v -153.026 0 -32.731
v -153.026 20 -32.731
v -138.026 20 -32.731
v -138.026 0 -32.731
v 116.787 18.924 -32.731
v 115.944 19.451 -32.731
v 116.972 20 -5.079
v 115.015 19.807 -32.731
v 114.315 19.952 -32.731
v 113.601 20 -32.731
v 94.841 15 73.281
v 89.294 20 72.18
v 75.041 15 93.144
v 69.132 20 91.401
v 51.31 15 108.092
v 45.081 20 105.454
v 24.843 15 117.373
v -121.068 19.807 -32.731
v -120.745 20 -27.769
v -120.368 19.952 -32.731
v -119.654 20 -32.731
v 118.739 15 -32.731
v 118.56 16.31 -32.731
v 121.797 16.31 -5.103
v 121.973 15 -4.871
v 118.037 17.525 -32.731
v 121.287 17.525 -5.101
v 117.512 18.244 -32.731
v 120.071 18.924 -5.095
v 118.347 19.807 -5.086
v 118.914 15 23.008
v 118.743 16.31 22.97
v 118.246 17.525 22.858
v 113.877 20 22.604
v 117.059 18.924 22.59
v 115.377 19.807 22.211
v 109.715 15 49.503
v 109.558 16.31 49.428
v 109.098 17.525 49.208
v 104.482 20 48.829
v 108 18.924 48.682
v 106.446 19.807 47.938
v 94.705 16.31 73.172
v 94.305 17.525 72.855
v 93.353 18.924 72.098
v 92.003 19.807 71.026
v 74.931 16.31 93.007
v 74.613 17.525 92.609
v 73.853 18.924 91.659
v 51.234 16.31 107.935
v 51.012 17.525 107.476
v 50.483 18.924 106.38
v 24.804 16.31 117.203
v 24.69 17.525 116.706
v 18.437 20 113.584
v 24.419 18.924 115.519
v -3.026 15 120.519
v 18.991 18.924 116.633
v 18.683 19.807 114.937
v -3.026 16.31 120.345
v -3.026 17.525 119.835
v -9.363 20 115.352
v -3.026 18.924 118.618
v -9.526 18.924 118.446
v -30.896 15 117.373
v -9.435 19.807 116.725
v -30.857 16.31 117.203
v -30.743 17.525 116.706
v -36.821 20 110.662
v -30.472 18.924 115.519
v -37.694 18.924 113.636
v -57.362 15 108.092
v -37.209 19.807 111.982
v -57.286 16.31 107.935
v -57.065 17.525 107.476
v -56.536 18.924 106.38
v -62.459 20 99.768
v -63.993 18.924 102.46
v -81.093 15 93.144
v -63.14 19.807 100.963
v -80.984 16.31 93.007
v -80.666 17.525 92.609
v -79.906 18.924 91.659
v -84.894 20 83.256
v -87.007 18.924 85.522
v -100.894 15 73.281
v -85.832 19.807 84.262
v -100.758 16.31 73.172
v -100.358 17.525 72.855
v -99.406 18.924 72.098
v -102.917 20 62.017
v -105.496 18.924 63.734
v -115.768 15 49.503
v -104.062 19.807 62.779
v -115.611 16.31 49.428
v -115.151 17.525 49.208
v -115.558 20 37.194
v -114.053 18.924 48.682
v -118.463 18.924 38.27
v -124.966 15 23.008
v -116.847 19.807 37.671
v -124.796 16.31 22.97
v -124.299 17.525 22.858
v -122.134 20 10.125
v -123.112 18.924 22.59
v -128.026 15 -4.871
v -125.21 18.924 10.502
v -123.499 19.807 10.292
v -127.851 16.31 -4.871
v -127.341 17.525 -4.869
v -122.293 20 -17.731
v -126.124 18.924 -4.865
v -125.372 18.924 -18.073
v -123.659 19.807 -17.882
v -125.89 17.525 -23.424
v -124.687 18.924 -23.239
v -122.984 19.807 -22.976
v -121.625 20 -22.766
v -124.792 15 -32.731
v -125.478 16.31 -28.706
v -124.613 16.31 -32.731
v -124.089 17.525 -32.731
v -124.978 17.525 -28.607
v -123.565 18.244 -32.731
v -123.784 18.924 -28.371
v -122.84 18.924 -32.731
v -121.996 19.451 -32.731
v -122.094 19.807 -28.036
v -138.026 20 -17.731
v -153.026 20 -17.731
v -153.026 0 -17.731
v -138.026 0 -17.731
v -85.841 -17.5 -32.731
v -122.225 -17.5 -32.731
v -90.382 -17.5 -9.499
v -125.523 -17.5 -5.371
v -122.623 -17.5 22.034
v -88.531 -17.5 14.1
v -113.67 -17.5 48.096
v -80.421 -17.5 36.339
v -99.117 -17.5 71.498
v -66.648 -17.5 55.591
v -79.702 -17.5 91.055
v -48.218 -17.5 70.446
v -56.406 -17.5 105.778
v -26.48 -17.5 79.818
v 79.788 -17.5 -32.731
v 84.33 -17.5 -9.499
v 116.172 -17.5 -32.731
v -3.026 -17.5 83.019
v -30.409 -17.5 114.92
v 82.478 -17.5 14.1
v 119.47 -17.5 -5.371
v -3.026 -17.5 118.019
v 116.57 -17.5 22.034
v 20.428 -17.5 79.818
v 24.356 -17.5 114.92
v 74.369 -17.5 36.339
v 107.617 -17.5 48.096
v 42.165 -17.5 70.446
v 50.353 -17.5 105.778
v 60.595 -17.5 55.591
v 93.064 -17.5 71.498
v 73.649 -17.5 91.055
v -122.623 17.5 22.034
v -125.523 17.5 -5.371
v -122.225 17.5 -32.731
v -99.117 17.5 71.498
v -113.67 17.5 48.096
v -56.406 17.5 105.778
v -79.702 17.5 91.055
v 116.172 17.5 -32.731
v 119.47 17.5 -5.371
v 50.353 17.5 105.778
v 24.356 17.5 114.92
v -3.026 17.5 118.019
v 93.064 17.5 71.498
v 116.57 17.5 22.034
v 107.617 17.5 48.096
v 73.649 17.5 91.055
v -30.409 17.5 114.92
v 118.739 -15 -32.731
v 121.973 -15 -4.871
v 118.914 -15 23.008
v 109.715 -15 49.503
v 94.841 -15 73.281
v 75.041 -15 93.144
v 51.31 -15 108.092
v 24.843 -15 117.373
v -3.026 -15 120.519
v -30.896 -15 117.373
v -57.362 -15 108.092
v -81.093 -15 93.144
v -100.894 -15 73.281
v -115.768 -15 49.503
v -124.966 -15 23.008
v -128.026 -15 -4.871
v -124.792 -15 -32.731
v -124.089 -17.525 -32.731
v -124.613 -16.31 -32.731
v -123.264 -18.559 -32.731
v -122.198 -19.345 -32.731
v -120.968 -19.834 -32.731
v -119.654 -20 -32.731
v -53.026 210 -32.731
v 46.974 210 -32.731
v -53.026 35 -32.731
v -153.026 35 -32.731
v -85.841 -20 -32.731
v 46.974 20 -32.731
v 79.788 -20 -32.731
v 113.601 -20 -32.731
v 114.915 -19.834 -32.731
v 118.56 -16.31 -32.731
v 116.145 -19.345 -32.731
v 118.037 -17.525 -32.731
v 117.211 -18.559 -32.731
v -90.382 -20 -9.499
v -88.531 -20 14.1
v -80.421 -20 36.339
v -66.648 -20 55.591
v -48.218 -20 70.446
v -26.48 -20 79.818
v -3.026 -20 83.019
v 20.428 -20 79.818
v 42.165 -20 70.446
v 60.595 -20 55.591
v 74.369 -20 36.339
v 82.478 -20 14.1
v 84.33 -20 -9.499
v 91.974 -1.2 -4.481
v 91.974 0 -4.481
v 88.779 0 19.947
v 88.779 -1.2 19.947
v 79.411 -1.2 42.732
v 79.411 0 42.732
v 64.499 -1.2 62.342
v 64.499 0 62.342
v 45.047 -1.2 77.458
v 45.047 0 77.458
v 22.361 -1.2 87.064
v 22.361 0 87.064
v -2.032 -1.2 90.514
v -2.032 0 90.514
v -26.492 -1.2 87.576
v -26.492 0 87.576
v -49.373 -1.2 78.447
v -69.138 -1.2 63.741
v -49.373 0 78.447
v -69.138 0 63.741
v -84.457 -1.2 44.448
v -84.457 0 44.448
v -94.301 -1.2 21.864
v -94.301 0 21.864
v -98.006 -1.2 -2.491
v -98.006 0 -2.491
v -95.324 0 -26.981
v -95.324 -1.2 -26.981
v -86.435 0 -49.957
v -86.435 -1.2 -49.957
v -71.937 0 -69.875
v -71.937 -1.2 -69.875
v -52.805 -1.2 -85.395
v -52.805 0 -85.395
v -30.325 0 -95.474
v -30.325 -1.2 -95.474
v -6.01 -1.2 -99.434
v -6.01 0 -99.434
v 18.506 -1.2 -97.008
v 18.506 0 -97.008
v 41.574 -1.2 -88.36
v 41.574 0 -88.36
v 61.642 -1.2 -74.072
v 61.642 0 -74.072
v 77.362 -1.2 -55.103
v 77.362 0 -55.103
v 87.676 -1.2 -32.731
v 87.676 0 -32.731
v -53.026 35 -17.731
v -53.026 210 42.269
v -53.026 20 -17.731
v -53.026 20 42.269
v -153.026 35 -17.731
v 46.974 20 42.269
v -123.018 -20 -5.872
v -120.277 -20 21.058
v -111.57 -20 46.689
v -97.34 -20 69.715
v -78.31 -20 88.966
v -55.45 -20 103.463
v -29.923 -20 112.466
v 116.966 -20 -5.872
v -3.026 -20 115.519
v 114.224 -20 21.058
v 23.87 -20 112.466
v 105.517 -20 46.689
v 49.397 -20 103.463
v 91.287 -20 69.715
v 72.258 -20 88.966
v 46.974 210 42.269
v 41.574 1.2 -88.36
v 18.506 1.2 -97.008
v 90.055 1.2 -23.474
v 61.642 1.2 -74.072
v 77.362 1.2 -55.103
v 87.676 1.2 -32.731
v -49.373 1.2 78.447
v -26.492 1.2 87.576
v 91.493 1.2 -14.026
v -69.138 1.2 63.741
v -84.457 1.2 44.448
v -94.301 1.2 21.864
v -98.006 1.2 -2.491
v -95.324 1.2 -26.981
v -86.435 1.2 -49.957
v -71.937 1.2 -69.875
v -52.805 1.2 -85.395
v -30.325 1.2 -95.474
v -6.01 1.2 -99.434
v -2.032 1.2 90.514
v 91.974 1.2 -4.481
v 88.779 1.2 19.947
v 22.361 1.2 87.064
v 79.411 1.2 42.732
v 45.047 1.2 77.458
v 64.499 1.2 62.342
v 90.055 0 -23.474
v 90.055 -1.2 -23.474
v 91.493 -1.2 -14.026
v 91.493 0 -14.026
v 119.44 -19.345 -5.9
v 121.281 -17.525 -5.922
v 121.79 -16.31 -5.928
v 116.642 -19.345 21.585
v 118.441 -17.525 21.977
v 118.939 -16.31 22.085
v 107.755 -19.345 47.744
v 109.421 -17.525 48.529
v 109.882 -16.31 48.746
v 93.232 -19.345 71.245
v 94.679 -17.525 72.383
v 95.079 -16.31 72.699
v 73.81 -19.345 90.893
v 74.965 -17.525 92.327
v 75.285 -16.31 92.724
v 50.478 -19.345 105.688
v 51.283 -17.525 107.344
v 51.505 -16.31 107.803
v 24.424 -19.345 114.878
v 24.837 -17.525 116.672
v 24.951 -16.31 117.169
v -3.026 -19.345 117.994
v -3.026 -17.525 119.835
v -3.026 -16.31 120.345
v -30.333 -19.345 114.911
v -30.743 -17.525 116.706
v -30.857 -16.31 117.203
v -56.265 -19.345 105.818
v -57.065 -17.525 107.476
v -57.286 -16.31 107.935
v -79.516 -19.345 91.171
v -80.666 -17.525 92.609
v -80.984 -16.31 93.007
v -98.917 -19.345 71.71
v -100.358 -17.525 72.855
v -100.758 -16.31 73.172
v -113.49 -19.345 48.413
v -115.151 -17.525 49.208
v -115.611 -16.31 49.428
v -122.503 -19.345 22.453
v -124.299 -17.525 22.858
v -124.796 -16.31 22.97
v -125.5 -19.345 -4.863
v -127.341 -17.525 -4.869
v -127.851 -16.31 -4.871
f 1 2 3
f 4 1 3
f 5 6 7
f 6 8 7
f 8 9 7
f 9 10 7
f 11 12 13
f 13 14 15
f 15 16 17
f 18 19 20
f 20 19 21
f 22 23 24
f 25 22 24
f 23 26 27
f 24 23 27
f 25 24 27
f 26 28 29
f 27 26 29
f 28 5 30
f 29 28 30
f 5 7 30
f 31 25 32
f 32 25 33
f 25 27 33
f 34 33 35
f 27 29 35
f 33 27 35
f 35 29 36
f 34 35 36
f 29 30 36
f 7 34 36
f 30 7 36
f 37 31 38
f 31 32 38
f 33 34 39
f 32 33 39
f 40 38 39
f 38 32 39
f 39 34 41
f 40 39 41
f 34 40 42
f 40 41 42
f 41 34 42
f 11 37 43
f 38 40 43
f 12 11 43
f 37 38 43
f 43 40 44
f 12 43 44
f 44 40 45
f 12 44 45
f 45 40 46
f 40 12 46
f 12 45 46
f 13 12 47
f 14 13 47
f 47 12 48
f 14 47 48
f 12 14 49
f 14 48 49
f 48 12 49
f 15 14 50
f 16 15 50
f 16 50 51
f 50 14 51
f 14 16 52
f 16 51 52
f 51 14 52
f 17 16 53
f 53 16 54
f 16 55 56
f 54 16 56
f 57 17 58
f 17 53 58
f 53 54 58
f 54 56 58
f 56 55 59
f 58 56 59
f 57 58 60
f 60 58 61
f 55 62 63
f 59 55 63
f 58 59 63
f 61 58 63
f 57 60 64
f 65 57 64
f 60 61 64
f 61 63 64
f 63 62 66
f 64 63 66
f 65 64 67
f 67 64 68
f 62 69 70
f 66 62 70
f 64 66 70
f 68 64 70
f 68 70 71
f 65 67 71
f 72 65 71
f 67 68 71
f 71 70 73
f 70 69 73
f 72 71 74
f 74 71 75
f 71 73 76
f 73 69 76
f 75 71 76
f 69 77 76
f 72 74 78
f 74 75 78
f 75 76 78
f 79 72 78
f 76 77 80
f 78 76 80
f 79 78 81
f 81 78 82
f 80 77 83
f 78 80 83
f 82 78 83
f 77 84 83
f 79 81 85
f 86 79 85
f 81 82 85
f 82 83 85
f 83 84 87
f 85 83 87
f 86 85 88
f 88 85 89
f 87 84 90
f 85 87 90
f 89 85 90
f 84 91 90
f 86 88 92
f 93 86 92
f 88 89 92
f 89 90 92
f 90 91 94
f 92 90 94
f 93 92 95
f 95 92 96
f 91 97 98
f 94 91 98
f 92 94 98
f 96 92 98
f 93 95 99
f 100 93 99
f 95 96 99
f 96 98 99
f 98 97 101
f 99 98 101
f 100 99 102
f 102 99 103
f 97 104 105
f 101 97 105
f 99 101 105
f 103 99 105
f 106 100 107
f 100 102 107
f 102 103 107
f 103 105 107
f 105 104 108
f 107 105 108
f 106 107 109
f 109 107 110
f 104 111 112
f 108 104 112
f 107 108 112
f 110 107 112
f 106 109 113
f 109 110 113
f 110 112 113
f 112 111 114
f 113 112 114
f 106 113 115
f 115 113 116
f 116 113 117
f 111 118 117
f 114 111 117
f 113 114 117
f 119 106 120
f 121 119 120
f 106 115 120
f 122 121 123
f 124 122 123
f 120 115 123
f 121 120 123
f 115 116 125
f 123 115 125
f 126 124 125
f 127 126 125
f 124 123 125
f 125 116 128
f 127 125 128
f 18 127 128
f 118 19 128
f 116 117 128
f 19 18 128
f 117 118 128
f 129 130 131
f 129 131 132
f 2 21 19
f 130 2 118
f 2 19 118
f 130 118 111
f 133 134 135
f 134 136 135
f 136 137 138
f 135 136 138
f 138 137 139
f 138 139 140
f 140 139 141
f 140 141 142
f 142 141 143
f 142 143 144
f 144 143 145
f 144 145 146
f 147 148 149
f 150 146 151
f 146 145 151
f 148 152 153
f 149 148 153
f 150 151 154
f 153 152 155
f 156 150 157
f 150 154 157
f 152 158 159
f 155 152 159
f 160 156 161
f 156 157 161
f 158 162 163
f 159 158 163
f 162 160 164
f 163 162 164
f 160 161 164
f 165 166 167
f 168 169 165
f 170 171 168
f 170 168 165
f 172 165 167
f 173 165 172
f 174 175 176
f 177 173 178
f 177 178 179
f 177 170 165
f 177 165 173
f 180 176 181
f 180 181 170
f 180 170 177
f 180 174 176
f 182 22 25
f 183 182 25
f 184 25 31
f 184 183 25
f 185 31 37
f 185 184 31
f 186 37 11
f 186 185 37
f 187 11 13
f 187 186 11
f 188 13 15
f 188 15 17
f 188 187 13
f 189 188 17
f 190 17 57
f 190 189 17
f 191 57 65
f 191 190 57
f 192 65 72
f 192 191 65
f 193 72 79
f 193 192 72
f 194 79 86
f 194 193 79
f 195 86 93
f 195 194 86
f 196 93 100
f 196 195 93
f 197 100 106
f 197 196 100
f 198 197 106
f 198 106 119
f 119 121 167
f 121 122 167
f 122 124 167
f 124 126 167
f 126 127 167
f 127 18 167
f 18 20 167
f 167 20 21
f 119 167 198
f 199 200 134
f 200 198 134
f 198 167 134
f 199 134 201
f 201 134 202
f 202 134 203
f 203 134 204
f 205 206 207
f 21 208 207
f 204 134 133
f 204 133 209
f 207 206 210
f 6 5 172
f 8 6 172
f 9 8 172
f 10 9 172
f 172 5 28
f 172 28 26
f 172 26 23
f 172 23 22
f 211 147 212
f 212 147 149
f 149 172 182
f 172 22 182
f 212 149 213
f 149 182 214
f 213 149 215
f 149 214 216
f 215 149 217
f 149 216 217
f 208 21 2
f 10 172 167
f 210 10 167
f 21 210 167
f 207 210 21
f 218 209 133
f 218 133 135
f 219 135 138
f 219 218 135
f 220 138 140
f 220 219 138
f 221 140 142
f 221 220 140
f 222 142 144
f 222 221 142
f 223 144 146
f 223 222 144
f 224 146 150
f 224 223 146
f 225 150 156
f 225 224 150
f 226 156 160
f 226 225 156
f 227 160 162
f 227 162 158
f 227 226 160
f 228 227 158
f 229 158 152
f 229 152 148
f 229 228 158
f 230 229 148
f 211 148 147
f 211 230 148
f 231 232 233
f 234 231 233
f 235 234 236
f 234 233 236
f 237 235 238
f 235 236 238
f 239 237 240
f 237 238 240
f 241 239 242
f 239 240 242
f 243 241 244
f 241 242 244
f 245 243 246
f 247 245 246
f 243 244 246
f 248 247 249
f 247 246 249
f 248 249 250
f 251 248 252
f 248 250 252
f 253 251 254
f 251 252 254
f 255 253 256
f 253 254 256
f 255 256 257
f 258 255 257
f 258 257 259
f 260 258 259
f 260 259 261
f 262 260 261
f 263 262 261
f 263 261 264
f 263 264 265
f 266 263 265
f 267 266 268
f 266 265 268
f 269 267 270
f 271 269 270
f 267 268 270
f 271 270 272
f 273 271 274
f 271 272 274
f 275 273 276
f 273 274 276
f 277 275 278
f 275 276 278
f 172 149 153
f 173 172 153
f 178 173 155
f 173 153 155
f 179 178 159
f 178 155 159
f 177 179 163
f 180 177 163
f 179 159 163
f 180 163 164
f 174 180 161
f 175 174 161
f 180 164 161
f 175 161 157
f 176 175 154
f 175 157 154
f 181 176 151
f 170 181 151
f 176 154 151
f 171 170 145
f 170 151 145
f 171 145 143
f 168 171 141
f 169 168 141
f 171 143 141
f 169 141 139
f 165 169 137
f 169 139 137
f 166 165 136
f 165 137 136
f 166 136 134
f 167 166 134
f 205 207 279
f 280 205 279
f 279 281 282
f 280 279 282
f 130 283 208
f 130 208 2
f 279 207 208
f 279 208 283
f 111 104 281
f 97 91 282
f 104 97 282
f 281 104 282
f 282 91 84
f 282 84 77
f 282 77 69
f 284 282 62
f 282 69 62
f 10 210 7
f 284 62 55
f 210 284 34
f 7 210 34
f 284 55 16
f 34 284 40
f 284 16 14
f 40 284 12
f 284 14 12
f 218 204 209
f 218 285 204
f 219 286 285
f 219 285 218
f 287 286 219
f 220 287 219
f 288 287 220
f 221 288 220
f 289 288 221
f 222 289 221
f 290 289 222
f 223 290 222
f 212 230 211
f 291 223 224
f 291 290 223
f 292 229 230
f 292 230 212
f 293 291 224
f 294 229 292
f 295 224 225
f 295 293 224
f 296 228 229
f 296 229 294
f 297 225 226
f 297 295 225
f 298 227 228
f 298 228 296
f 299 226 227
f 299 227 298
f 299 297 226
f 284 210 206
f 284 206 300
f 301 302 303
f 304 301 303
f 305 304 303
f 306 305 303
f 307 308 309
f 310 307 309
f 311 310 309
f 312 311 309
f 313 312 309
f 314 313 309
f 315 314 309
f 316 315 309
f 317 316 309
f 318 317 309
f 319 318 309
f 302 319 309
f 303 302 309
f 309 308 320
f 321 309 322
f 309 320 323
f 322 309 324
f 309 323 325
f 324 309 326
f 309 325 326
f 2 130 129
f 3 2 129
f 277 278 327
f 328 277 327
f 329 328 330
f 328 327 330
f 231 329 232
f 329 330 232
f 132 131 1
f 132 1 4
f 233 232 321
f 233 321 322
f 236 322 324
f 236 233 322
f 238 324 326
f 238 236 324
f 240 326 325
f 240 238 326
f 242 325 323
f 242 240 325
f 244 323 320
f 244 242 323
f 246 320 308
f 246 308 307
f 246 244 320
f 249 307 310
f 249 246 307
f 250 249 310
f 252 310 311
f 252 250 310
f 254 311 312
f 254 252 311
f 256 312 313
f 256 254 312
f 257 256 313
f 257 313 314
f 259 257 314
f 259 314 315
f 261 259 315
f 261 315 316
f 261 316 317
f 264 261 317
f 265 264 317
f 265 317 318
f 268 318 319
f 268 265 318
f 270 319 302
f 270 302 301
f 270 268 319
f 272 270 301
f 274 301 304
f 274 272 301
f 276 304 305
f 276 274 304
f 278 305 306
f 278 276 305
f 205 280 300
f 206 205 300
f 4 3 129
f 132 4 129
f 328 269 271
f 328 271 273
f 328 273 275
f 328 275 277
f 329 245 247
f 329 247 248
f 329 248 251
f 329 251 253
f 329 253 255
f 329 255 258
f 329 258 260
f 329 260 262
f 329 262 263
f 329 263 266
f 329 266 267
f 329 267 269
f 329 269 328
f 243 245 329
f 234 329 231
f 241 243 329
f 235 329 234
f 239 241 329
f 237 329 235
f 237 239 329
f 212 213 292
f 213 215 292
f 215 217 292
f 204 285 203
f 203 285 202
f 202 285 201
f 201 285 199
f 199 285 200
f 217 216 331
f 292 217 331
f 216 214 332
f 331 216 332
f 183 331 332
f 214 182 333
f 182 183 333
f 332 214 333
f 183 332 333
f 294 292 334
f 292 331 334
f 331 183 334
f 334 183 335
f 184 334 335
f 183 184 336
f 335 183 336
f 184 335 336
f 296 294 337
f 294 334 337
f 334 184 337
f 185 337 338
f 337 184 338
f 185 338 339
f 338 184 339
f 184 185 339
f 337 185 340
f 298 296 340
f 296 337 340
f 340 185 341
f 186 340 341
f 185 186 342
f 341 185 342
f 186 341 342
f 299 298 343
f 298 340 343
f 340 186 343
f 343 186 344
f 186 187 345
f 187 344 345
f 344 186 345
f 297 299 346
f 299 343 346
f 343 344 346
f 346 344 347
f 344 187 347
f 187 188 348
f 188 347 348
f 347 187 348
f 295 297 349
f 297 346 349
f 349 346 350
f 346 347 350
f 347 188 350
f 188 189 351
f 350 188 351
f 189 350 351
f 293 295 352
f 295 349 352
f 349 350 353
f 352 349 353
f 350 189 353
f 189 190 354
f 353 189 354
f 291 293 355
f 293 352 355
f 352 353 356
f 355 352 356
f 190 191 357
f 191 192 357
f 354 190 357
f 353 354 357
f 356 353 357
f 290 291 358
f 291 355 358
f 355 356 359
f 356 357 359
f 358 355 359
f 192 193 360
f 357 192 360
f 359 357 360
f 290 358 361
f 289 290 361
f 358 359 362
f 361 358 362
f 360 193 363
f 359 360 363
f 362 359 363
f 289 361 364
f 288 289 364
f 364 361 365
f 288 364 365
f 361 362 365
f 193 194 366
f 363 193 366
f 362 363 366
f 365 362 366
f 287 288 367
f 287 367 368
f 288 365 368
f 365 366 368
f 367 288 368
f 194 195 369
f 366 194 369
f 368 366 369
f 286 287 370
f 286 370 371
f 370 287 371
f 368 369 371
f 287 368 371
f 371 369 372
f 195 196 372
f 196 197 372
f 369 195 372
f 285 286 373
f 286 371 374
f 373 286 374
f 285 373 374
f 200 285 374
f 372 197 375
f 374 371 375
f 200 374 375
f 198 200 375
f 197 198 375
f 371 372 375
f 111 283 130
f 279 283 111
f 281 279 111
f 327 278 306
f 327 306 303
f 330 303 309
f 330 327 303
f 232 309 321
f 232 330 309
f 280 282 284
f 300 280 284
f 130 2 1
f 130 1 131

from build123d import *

# Parameters (mm, degrees)
F1_DEPTH  = 20
F2_T      = -2.5
F3_START  = -17.5
F3_DEPTH  = 2.5
F4_START  = -17.5
F0_W      = 100
F0_H      = 75
F4_DEPTH  = 192.5
F5_R      = 5
F6_DEPTH  = 1.2
F7_W      = 15
F7_H      = 15
F8_DEPTH  = 100
F9_W      = 15
F9_H      = 15
F10_DEPTH = 20


with BuildPart() as f1:
    # F0 (on Front) → F1 (new body, symmetric)
    with BuildSketch(Plane.XZ):
        with BuildLine():
            ThreePointArc((-93.7288880384, -32.7305903801), (-17.3139573127, 89.4389150959), (91.973567456, -4.4805537909))
            ThreePointArc((91.973567456, -4.4805537909), (90.8930363428, -18.7680785596), (87.6760229504, -32.7305903801))
            Line((87.6760229504, -32.7305903801), (118.739471685, -32.7305903801))
            ThreePointArc((118.739471685, -32.7305903801), (-3.026432544, 120.5194462091), (-124.792336773, -32.7305903801))
            Line((-124.792336773, -32.7305903801), (-93.7288880384, -32.7305903801))
        make_face()
        with BuildLine():
            ThreePointArc((87.6760229504, -32.7305903801), (90.8930363428, -18.7680785596), (91.973567456, -4.4805537909))
            ThreePointArc((91.973567456, -4.4805537909), (-17.3139573127, 89.4389150959), (-93.7288880384, -32.7305903801))
            Line((-93.7288880384, -32.7305903801), (-85.8405945739, -32.7305903801))
            ThreePointArc((-85.8405945739, -32.7305903801), (-3.026432544, 83.0194462091), (79.7877294859, -32.7305903801))
            Line((79.7877294859, -32.7305903801), (87.6760229504, -32.7305903801))
        make_face()
    extrude(amount=F1_DEPTH, both=True)

    # F2
    f2_openings = [f1.faces().sort_by_distance(p)[0] for p in [
        (-3.026433, 0, 83.019446),
        (99.263601, 0, -32.73059),
        (-105.316466, 0, -32.73059),
    ]]
    offset(amount=F2_T, openings=f2_openings)

    # F0 (on Front) → F3 (join)
    with BuildSketch(Plane.XZ.offset(F3_START)):
        with BuildLine():
            ThreePointArc((79.7877294859, -32.7305903801), (-3.026432544, 83.0194462091), (-85.8405945739, -32.7305903801))
            Line((-85.8405945739, -32.7305903801), (-53.026432544, -32.7305903801))
            Line((-53.026432544, -32.7305903801), (-53.026432544, 42.2694096199))
            Line((-53.026432544, 42.2694096199), (46.973567456, 42.2694096199))
            Line((46.973567456, 42.2694096199), (46.973567456, -32.7305903801))
            Line((46.973567456, -32.7305903801), (79.7877294859, -32.7305903801))
        make_face()
    extrude(amount=-F3_DEPTH)

    # F0 (on Front) → F4 (join)
    with BuildSketch(Plane.XZ.offset(F4_START)):
        with Locations((-3.026432544, 4.7694096199)):
            Rectangle(F0_W, F0_H)
    extrude(amount=-F4_DEPTH)

    # F5
    f5_edges = [f1.edges().sort_by_distance(p)[0] for p in [
        (-3.026433, -20, 120.519446),
        (-3.026433, 20, 120.519446),
    ]]
    fillet(f5_edges, radius=F5_R)

    # F7 (on face) → F8 (join)
    with BuildSketch(Plane(origin=(-53.026432544, 0, 0), x_dir=(0, -1, 0), z_dir=(-1, 0, 0))):
        with Locations((-27.5, -25.2305903801)):
            Rectangle(F7_W, F7_H)
    extrude(amount=F8_DEPTH)


with BuildPart() as f6:
    # F0 (on Front) → F6 (new body, symmetric)
    with BuildSketch(Plane.XZ):
        with BuildLine():
            ThreePointArc((87.6760229504, -32.7305903801), (90.8930363428, -18.7680785596), (91.973567456, -4.4805537909))
            ThreePointArc((91.973567456, -4.4805537909), (-17.3139573127, 89.4389150959), (-93.7288880384, -32.7305903801))
            Line((-93.7288880384, -32.7305903801), (-85.8405945739, -32.7305903801))
            ThreePointArc((-85.8405945739, -32.7305903801), (-3.026432544, 83.0194462091), (79.7877294859, -32.7305903801))
            Line((79.7877294859, -32.7305903801), (87.6760229504, -32.7305903801))
        make_face()
        with BuildLine():
            ThreePointArc((79.7877294859, -32.7305903801), (-3.026432544, 83.0194462091), (-85.8405945739, -32.7305903801))
            Line((-85.8405945739, -32.7305903801), (-53.026432544, -32.7305903801))
            Line((-53.026432544, -32.7305903801), (-53.026432544, 42.2694096199))
            Line((-53.026432544, 42.2694096199), (46.973567456, 42.2694096199))
            Line((46.973567456, 42.2694096199), (46.973567456, -32.7305903801))
            Line((46.973567456, -32.7305903801), (79.7877294859, -32.7305903801))
        make_face()
        with Locations((-3.026432544, 4.7694096199)):
            Rectangle(F0_W, F0_H)
        with BuildLine():
            Line((-85.8405945739, -32.7305903801), (-93.7288880384, -32.7305903801))
            ThreePointArc((-93.7288880384, -32.7305903801), (-3.026432544, -99.4805537909), (87.6760229504, -32.7305903801))
            Line((87.6760229504, -32.7305903801), (79.7877294859, -32.7305903801))
            Line((79.7877294859, -32.7305903801), (46.973567456, -32.7305903801))
            Line((46.973567456, -32.7305903801), (-53.026432544, -32.7305903801))
            Line((-53.026432544, -32.7305903801), (-85.8405945739, -32.7305903801))
        make_face()
    extrude(amount=F6_DEPTH, both=True)


with BuildPart() as f10:
    # F9 (on face) → F10 (new body)
    with BuildSketch(Plane.XZ.offset(-20)):
        with Locations((-145.526432544, -25.2305903801)):
            Rectangle(F9_W, F9_H)
    extrude(amount=F10_DEPTH)


solid = Compound([f1.part, f6.part, f10.part])
